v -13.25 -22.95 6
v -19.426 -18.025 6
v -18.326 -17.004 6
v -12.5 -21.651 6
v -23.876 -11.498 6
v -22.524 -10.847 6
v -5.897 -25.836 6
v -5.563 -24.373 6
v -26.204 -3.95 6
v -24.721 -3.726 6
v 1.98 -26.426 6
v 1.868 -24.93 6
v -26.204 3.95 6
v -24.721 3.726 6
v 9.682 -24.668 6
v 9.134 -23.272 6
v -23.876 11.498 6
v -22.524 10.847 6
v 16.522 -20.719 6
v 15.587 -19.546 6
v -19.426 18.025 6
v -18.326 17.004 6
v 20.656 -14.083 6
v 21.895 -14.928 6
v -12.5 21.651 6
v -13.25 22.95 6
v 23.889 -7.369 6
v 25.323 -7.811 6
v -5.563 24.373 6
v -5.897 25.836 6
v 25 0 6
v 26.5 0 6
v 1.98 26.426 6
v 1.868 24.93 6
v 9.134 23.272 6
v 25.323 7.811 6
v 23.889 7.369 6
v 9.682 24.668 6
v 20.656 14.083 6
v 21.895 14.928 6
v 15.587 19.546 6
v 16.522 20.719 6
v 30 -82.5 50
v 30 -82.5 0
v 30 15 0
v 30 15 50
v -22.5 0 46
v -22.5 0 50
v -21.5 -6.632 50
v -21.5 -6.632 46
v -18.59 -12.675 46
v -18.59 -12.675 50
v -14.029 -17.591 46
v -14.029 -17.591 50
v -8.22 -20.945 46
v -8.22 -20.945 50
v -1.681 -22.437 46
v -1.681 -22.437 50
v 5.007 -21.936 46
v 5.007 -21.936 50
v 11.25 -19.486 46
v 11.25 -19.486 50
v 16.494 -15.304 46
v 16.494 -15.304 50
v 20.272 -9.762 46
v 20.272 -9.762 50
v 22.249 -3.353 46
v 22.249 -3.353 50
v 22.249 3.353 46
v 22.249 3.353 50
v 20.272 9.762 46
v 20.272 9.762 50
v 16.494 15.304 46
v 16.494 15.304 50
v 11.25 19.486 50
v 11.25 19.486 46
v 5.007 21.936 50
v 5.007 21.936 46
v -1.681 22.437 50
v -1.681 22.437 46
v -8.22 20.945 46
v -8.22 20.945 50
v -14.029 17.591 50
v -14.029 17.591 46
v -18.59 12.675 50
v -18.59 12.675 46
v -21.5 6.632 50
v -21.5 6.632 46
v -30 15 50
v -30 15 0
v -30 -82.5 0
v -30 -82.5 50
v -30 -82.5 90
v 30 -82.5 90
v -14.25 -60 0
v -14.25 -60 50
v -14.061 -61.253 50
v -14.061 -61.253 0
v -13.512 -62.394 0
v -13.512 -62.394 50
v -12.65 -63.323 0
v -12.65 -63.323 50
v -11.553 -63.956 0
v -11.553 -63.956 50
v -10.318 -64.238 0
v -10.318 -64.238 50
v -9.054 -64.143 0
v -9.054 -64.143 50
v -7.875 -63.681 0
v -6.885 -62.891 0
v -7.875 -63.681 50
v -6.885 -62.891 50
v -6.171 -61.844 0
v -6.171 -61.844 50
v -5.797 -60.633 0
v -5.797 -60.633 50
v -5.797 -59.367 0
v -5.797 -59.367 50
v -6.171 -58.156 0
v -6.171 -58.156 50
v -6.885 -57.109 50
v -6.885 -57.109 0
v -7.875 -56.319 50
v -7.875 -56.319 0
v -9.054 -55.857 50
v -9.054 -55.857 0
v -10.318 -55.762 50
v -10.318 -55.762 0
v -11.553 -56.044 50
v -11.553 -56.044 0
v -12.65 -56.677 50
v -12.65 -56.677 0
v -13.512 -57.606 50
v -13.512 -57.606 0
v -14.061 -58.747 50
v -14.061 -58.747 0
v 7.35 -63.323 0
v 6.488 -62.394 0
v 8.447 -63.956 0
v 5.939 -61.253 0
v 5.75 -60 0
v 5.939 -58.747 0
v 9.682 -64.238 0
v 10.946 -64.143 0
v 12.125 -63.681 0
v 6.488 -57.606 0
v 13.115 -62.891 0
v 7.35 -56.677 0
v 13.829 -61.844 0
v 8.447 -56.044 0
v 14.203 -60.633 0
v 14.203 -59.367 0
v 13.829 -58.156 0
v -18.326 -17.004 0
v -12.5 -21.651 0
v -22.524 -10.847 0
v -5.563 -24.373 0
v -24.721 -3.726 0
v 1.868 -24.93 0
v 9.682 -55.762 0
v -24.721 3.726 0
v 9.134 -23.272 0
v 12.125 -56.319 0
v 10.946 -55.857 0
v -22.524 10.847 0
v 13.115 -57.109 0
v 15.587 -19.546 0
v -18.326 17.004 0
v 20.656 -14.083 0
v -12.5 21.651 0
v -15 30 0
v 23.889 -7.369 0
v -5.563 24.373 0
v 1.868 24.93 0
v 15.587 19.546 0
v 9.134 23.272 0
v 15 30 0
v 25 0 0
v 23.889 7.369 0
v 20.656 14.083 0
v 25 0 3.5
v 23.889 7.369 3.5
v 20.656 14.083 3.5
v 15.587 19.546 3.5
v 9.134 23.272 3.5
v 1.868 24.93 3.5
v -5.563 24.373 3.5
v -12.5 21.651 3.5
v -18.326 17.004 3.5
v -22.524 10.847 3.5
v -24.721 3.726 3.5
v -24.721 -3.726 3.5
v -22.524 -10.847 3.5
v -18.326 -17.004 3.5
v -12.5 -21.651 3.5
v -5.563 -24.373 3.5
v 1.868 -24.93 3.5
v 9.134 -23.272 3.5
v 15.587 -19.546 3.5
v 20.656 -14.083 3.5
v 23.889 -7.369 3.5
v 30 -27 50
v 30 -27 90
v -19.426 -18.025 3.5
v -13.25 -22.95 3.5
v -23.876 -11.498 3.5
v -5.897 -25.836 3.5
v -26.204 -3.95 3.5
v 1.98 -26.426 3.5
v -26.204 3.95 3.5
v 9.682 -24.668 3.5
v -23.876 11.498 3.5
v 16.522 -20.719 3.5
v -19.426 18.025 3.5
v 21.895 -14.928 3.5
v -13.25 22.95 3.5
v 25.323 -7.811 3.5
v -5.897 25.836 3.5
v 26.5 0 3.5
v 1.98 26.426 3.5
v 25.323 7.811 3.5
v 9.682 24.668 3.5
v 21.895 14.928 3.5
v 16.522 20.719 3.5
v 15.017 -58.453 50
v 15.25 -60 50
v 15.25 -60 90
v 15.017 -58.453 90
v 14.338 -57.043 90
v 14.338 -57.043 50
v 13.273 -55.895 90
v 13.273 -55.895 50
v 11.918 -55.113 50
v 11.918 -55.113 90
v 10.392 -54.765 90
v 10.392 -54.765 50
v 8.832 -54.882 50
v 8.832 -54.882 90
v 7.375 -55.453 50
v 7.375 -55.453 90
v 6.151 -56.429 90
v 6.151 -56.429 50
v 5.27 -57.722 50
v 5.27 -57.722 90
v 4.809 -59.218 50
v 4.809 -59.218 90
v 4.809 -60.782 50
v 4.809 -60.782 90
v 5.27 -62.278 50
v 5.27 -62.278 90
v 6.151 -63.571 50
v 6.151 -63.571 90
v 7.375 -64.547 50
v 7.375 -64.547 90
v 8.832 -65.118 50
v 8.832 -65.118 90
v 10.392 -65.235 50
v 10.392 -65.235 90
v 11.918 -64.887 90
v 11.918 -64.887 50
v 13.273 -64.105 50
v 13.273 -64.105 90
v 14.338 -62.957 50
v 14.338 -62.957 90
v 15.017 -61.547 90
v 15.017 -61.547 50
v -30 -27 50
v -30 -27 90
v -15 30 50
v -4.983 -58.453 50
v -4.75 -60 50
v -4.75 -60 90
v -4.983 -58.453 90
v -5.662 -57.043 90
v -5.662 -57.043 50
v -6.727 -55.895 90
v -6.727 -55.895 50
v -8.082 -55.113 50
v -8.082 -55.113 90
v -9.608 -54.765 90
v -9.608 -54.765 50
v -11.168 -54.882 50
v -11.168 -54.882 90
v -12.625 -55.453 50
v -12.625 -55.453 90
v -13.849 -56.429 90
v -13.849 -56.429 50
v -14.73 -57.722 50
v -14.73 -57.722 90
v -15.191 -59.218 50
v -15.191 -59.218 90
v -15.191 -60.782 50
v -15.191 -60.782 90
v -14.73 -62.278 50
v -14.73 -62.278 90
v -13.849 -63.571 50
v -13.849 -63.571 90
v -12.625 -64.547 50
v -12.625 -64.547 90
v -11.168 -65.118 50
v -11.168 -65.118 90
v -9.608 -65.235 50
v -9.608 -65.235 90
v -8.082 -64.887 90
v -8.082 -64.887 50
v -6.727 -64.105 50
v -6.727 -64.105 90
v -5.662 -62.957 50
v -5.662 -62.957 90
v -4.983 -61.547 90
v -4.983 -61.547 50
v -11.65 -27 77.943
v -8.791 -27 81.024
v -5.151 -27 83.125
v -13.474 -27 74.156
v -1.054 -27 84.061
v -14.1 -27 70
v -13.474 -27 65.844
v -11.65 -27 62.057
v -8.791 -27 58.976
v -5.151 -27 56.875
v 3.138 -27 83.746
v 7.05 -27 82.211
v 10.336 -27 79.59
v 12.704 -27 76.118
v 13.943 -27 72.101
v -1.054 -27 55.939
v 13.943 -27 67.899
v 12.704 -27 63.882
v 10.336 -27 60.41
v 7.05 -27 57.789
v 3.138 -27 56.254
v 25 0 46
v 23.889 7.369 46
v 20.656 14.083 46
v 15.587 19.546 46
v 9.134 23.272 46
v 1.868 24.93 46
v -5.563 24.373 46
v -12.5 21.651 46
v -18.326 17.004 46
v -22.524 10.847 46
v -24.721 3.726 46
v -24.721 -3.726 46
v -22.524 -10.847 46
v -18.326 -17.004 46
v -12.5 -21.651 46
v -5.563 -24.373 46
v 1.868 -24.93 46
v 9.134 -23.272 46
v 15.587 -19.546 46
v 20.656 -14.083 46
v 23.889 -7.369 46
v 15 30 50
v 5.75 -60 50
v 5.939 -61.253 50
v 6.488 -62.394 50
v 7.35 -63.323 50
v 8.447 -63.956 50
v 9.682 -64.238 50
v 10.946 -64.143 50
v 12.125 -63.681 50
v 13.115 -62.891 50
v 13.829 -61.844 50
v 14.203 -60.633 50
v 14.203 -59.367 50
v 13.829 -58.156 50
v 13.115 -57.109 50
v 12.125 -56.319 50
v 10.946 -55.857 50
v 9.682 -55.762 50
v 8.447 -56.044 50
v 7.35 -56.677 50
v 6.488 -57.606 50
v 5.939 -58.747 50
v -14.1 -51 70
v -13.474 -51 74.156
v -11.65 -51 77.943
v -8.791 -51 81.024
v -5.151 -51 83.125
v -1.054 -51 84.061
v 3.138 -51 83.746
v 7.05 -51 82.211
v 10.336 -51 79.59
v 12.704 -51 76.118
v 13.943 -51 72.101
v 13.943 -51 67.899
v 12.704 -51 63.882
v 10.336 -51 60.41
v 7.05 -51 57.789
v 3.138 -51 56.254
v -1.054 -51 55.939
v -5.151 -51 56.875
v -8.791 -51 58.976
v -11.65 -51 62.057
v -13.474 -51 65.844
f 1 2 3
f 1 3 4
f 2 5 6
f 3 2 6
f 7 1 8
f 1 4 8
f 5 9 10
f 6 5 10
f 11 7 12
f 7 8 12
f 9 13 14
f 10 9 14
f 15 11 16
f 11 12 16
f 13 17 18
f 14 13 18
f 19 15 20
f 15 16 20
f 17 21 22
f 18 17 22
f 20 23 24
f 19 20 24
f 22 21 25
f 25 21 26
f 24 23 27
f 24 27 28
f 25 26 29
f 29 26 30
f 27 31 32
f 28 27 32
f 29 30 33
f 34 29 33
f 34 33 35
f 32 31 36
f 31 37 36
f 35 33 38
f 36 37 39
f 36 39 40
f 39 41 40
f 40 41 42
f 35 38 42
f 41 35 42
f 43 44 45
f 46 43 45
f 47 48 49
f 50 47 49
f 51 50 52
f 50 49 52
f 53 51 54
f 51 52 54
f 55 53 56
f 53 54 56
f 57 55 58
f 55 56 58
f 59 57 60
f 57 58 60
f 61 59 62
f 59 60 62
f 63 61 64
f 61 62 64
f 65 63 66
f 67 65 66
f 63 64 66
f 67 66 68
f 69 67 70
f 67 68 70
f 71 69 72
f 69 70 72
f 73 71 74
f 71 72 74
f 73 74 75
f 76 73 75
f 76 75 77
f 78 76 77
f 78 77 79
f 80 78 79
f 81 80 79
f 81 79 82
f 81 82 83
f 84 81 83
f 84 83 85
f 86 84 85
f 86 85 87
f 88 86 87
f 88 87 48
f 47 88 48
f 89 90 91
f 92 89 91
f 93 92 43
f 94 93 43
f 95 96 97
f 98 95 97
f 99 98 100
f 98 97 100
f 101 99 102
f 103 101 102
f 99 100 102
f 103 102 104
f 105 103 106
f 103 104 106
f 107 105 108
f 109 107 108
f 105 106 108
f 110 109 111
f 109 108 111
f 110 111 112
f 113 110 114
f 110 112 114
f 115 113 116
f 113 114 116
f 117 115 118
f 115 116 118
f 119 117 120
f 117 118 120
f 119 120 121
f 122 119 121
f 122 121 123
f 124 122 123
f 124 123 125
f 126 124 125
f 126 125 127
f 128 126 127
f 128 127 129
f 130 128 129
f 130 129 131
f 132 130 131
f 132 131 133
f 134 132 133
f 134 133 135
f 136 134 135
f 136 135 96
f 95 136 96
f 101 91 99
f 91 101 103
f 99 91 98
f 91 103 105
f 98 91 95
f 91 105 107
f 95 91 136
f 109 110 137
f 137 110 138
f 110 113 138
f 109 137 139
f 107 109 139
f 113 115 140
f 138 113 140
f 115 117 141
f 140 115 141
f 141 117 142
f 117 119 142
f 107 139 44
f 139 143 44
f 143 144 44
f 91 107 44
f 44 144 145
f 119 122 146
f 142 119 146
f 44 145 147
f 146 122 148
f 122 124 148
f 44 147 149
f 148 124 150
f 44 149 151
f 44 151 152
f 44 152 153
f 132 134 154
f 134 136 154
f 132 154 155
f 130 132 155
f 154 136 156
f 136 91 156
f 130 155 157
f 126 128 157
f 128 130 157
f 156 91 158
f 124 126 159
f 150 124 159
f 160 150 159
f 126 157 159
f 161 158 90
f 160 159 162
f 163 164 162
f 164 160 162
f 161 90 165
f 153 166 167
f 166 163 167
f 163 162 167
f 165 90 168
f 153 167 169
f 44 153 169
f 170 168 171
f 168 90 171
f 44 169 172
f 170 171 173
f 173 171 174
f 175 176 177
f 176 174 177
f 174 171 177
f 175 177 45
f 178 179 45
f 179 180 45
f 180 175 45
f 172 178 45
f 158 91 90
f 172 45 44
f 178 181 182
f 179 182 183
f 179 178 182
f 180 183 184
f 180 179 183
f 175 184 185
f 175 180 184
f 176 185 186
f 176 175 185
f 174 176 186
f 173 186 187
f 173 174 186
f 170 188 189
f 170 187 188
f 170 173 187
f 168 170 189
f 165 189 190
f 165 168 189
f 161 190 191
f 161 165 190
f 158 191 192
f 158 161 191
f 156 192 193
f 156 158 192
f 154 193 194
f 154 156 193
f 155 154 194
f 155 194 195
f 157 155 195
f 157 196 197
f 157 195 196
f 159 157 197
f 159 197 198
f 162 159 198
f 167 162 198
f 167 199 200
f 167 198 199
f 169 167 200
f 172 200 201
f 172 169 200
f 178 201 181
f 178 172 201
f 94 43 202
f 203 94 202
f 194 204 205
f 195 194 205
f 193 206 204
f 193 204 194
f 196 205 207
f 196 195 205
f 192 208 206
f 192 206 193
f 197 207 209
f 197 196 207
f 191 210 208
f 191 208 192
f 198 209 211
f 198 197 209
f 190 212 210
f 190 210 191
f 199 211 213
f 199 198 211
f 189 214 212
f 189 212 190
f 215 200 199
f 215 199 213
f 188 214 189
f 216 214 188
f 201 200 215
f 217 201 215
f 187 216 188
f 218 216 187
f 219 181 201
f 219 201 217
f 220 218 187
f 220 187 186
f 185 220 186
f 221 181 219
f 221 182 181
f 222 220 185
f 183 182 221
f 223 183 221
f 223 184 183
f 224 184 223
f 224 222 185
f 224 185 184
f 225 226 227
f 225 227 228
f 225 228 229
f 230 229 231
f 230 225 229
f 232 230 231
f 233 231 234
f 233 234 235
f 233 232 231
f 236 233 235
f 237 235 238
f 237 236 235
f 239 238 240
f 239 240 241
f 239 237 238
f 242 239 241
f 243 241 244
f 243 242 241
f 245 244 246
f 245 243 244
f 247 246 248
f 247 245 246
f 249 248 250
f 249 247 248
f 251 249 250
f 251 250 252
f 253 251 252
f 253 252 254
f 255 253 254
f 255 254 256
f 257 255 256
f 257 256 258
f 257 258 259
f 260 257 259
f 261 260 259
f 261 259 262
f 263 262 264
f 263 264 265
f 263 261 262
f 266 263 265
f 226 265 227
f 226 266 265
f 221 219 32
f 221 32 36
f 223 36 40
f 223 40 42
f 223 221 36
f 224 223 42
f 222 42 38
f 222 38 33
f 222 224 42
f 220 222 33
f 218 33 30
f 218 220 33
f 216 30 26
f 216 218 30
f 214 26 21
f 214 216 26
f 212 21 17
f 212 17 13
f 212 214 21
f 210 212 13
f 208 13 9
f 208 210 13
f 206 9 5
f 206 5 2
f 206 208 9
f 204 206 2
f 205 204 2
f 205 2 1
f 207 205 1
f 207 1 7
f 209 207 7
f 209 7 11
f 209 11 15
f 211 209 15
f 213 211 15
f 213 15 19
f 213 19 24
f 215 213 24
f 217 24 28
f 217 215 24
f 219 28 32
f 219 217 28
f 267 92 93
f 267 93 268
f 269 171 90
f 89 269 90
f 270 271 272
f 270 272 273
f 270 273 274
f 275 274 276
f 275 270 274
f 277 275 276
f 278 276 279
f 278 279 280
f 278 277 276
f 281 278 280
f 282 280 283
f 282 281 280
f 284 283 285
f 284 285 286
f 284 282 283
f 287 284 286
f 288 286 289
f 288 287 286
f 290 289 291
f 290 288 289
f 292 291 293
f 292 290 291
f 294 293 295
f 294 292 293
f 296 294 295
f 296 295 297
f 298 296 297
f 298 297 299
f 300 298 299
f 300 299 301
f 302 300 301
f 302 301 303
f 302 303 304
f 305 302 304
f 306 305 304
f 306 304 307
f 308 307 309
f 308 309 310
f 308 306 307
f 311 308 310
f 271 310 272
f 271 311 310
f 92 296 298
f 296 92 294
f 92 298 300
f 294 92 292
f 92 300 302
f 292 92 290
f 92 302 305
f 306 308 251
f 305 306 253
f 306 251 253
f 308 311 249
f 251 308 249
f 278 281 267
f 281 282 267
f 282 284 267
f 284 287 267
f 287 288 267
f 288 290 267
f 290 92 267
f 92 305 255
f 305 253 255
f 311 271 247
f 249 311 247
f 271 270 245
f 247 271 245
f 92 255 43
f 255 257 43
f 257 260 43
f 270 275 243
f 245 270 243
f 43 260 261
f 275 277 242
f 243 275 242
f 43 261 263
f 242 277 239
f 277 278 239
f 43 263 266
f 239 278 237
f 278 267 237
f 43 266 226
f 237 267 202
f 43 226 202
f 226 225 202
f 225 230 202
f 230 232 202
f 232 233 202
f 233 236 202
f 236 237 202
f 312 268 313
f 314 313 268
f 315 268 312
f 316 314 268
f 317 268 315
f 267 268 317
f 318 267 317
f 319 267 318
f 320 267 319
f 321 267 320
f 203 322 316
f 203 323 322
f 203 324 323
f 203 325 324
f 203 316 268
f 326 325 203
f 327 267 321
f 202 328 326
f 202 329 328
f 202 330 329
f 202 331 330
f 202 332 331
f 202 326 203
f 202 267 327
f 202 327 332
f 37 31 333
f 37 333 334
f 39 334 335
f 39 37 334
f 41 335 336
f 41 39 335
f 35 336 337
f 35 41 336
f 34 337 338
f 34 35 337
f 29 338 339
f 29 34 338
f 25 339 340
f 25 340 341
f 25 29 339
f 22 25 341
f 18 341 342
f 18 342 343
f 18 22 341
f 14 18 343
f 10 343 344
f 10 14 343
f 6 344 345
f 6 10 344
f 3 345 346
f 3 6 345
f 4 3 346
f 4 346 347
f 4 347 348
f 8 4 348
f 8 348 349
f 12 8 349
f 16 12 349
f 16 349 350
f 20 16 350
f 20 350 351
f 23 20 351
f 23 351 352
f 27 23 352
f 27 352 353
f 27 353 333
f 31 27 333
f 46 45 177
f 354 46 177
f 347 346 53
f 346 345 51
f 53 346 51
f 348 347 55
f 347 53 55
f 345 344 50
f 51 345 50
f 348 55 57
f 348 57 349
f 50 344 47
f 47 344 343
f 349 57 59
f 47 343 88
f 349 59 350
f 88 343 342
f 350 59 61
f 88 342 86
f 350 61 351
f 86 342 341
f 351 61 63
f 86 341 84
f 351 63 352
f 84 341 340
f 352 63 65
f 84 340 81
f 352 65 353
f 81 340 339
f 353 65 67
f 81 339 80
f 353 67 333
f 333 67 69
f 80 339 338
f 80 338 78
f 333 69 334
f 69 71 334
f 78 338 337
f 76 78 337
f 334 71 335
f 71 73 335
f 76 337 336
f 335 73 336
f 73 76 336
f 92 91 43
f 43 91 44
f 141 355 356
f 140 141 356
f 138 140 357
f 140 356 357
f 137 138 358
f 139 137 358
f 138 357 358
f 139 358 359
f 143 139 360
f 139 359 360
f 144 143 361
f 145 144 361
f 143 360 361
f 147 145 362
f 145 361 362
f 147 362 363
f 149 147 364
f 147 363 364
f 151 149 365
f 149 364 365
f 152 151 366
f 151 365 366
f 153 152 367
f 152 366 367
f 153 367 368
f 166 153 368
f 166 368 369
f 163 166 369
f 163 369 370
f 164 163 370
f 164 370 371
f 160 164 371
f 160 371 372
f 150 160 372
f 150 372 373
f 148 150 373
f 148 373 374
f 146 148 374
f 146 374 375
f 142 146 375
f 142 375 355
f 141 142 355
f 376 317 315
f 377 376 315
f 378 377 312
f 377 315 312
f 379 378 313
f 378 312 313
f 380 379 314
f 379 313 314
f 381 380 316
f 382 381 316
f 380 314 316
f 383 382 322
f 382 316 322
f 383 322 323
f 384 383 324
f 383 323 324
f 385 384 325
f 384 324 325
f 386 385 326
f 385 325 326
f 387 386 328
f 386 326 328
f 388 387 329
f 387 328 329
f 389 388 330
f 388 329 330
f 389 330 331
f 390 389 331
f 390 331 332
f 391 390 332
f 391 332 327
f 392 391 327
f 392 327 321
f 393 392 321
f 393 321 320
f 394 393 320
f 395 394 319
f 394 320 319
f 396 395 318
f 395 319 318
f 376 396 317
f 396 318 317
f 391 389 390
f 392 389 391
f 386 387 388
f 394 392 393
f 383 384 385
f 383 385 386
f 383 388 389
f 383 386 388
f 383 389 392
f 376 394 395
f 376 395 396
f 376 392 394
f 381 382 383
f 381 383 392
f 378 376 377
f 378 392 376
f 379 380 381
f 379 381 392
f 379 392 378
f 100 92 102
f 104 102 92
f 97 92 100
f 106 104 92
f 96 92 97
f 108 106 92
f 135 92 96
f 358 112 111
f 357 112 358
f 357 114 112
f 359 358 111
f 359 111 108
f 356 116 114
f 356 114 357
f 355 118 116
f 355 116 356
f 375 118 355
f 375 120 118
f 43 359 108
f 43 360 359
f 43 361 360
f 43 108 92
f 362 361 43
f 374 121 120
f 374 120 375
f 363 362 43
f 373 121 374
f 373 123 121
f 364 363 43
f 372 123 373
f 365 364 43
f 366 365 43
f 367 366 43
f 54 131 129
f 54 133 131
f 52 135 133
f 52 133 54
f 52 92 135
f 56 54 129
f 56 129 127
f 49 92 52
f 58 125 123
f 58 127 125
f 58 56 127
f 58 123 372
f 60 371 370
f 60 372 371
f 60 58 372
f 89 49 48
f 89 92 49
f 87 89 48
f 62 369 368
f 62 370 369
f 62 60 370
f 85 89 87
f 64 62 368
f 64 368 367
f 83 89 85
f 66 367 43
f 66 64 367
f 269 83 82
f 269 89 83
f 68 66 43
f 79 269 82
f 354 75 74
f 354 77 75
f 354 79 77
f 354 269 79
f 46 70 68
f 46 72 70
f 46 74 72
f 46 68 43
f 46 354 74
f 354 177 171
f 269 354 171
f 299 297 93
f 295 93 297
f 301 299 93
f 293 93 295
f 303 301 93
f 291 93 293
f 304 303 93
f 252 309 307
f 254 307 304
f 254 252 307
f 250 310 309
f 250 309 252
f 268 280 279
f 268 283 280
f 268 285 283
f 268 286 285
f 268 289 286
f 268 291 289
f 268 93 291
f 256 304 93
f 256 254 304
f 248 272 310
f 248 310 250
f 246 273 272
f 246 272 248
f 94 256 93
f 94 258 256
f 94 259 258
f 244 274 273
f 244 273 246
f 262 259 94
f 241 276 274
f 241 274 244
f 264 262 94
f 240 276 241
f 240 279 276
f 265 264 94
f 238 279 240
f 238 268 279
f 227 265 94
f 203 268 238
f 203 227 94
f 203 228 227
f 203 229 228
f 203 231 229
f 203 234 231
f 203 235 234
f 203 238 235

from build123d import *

# Parameters (mm, degrees)
F1_DEPTH  = 50
F2_D      = 8.5
F3_D      = 45
F4_R      = 25
F5_DEPTH  = 46
F7_START  = 3.5
F6_R      = 26.5
F7_DEPTH  = 2.5
F8_W      = 60
F8_H      = 55.5
F8_R      = 5.25
F9_DEPTH  = 40
F10_R     = 14.1
F11_DEPTH = 24


with BuildPart() as f1:
    # F0 (on Top) → F1 (new body)
    with BuildSketch(Plane.XY):
        Polygon((15, 30), (-15, 30), (-30, 15), (-30, -82.5), (30, -82.5), (30, 15), align=None)
    extrude(amount=F1_DEPTH)

    # F2 (through all)
    with Locations(Plane(origin=(0, 0, 0), x_dir=(1, 0, 0), z_dir=(0, 0, -1))):
        with Locations((-10, 60), (10, 60)):
            Hole(F2_D / 2)

    # F3 (through all)
    with Locations(Plane(origin=(0, 0, 0), x_dir=(1, 0, 0), z_dir=(0, 0, -1))):
        with Locations((0, 0)):
            Hole(F3_D / 2)

    # F4 (on Top) → F5 (cut)
    with BuildSketch(Plane.XY):
        Circle(F4_R)
    extrude(amount=F5_DEPTH, mode=Mode.SUBTRACT)

    # F6 (on Top) → F7 (cut)
    with BuildSketch(Plane.XY.offset(F7_START)):
        Circle(F6_R)
    extrude(amount=F7_DEPTH, mode=Mode.SUBTRACT)


with BuildPart() as f9:
    # F8 (on face) → F9 (new body)
    with BuildSketch(Plane.XY.offset(50)):
        with Locations((0, -54.75)):
            Rectangle(F8_W, F8_H)
        with Locations((-10, -60)):
            Circle(F8_R, mode=Mode.SUBTRACT)
        with Locations((10, -60)):
            Circle(F8_R, mode=Mode.SUBTRACT)
    extrude(amount=F9_DEPTH)

    # F10 (on face) → F11 (cut)
    with BuildSketch(Plane(origin=(0, -27, 0), x_dir=(-1, 0, 0), z_dir=(0, 1, 0))):
        with Locations((0, 70)):
            Circle(F10_R)
    extrude(amount=-F11_DEPTH, mode=Mode.SUBTRACT)


solid = Compound([f1.part, f9.part])
